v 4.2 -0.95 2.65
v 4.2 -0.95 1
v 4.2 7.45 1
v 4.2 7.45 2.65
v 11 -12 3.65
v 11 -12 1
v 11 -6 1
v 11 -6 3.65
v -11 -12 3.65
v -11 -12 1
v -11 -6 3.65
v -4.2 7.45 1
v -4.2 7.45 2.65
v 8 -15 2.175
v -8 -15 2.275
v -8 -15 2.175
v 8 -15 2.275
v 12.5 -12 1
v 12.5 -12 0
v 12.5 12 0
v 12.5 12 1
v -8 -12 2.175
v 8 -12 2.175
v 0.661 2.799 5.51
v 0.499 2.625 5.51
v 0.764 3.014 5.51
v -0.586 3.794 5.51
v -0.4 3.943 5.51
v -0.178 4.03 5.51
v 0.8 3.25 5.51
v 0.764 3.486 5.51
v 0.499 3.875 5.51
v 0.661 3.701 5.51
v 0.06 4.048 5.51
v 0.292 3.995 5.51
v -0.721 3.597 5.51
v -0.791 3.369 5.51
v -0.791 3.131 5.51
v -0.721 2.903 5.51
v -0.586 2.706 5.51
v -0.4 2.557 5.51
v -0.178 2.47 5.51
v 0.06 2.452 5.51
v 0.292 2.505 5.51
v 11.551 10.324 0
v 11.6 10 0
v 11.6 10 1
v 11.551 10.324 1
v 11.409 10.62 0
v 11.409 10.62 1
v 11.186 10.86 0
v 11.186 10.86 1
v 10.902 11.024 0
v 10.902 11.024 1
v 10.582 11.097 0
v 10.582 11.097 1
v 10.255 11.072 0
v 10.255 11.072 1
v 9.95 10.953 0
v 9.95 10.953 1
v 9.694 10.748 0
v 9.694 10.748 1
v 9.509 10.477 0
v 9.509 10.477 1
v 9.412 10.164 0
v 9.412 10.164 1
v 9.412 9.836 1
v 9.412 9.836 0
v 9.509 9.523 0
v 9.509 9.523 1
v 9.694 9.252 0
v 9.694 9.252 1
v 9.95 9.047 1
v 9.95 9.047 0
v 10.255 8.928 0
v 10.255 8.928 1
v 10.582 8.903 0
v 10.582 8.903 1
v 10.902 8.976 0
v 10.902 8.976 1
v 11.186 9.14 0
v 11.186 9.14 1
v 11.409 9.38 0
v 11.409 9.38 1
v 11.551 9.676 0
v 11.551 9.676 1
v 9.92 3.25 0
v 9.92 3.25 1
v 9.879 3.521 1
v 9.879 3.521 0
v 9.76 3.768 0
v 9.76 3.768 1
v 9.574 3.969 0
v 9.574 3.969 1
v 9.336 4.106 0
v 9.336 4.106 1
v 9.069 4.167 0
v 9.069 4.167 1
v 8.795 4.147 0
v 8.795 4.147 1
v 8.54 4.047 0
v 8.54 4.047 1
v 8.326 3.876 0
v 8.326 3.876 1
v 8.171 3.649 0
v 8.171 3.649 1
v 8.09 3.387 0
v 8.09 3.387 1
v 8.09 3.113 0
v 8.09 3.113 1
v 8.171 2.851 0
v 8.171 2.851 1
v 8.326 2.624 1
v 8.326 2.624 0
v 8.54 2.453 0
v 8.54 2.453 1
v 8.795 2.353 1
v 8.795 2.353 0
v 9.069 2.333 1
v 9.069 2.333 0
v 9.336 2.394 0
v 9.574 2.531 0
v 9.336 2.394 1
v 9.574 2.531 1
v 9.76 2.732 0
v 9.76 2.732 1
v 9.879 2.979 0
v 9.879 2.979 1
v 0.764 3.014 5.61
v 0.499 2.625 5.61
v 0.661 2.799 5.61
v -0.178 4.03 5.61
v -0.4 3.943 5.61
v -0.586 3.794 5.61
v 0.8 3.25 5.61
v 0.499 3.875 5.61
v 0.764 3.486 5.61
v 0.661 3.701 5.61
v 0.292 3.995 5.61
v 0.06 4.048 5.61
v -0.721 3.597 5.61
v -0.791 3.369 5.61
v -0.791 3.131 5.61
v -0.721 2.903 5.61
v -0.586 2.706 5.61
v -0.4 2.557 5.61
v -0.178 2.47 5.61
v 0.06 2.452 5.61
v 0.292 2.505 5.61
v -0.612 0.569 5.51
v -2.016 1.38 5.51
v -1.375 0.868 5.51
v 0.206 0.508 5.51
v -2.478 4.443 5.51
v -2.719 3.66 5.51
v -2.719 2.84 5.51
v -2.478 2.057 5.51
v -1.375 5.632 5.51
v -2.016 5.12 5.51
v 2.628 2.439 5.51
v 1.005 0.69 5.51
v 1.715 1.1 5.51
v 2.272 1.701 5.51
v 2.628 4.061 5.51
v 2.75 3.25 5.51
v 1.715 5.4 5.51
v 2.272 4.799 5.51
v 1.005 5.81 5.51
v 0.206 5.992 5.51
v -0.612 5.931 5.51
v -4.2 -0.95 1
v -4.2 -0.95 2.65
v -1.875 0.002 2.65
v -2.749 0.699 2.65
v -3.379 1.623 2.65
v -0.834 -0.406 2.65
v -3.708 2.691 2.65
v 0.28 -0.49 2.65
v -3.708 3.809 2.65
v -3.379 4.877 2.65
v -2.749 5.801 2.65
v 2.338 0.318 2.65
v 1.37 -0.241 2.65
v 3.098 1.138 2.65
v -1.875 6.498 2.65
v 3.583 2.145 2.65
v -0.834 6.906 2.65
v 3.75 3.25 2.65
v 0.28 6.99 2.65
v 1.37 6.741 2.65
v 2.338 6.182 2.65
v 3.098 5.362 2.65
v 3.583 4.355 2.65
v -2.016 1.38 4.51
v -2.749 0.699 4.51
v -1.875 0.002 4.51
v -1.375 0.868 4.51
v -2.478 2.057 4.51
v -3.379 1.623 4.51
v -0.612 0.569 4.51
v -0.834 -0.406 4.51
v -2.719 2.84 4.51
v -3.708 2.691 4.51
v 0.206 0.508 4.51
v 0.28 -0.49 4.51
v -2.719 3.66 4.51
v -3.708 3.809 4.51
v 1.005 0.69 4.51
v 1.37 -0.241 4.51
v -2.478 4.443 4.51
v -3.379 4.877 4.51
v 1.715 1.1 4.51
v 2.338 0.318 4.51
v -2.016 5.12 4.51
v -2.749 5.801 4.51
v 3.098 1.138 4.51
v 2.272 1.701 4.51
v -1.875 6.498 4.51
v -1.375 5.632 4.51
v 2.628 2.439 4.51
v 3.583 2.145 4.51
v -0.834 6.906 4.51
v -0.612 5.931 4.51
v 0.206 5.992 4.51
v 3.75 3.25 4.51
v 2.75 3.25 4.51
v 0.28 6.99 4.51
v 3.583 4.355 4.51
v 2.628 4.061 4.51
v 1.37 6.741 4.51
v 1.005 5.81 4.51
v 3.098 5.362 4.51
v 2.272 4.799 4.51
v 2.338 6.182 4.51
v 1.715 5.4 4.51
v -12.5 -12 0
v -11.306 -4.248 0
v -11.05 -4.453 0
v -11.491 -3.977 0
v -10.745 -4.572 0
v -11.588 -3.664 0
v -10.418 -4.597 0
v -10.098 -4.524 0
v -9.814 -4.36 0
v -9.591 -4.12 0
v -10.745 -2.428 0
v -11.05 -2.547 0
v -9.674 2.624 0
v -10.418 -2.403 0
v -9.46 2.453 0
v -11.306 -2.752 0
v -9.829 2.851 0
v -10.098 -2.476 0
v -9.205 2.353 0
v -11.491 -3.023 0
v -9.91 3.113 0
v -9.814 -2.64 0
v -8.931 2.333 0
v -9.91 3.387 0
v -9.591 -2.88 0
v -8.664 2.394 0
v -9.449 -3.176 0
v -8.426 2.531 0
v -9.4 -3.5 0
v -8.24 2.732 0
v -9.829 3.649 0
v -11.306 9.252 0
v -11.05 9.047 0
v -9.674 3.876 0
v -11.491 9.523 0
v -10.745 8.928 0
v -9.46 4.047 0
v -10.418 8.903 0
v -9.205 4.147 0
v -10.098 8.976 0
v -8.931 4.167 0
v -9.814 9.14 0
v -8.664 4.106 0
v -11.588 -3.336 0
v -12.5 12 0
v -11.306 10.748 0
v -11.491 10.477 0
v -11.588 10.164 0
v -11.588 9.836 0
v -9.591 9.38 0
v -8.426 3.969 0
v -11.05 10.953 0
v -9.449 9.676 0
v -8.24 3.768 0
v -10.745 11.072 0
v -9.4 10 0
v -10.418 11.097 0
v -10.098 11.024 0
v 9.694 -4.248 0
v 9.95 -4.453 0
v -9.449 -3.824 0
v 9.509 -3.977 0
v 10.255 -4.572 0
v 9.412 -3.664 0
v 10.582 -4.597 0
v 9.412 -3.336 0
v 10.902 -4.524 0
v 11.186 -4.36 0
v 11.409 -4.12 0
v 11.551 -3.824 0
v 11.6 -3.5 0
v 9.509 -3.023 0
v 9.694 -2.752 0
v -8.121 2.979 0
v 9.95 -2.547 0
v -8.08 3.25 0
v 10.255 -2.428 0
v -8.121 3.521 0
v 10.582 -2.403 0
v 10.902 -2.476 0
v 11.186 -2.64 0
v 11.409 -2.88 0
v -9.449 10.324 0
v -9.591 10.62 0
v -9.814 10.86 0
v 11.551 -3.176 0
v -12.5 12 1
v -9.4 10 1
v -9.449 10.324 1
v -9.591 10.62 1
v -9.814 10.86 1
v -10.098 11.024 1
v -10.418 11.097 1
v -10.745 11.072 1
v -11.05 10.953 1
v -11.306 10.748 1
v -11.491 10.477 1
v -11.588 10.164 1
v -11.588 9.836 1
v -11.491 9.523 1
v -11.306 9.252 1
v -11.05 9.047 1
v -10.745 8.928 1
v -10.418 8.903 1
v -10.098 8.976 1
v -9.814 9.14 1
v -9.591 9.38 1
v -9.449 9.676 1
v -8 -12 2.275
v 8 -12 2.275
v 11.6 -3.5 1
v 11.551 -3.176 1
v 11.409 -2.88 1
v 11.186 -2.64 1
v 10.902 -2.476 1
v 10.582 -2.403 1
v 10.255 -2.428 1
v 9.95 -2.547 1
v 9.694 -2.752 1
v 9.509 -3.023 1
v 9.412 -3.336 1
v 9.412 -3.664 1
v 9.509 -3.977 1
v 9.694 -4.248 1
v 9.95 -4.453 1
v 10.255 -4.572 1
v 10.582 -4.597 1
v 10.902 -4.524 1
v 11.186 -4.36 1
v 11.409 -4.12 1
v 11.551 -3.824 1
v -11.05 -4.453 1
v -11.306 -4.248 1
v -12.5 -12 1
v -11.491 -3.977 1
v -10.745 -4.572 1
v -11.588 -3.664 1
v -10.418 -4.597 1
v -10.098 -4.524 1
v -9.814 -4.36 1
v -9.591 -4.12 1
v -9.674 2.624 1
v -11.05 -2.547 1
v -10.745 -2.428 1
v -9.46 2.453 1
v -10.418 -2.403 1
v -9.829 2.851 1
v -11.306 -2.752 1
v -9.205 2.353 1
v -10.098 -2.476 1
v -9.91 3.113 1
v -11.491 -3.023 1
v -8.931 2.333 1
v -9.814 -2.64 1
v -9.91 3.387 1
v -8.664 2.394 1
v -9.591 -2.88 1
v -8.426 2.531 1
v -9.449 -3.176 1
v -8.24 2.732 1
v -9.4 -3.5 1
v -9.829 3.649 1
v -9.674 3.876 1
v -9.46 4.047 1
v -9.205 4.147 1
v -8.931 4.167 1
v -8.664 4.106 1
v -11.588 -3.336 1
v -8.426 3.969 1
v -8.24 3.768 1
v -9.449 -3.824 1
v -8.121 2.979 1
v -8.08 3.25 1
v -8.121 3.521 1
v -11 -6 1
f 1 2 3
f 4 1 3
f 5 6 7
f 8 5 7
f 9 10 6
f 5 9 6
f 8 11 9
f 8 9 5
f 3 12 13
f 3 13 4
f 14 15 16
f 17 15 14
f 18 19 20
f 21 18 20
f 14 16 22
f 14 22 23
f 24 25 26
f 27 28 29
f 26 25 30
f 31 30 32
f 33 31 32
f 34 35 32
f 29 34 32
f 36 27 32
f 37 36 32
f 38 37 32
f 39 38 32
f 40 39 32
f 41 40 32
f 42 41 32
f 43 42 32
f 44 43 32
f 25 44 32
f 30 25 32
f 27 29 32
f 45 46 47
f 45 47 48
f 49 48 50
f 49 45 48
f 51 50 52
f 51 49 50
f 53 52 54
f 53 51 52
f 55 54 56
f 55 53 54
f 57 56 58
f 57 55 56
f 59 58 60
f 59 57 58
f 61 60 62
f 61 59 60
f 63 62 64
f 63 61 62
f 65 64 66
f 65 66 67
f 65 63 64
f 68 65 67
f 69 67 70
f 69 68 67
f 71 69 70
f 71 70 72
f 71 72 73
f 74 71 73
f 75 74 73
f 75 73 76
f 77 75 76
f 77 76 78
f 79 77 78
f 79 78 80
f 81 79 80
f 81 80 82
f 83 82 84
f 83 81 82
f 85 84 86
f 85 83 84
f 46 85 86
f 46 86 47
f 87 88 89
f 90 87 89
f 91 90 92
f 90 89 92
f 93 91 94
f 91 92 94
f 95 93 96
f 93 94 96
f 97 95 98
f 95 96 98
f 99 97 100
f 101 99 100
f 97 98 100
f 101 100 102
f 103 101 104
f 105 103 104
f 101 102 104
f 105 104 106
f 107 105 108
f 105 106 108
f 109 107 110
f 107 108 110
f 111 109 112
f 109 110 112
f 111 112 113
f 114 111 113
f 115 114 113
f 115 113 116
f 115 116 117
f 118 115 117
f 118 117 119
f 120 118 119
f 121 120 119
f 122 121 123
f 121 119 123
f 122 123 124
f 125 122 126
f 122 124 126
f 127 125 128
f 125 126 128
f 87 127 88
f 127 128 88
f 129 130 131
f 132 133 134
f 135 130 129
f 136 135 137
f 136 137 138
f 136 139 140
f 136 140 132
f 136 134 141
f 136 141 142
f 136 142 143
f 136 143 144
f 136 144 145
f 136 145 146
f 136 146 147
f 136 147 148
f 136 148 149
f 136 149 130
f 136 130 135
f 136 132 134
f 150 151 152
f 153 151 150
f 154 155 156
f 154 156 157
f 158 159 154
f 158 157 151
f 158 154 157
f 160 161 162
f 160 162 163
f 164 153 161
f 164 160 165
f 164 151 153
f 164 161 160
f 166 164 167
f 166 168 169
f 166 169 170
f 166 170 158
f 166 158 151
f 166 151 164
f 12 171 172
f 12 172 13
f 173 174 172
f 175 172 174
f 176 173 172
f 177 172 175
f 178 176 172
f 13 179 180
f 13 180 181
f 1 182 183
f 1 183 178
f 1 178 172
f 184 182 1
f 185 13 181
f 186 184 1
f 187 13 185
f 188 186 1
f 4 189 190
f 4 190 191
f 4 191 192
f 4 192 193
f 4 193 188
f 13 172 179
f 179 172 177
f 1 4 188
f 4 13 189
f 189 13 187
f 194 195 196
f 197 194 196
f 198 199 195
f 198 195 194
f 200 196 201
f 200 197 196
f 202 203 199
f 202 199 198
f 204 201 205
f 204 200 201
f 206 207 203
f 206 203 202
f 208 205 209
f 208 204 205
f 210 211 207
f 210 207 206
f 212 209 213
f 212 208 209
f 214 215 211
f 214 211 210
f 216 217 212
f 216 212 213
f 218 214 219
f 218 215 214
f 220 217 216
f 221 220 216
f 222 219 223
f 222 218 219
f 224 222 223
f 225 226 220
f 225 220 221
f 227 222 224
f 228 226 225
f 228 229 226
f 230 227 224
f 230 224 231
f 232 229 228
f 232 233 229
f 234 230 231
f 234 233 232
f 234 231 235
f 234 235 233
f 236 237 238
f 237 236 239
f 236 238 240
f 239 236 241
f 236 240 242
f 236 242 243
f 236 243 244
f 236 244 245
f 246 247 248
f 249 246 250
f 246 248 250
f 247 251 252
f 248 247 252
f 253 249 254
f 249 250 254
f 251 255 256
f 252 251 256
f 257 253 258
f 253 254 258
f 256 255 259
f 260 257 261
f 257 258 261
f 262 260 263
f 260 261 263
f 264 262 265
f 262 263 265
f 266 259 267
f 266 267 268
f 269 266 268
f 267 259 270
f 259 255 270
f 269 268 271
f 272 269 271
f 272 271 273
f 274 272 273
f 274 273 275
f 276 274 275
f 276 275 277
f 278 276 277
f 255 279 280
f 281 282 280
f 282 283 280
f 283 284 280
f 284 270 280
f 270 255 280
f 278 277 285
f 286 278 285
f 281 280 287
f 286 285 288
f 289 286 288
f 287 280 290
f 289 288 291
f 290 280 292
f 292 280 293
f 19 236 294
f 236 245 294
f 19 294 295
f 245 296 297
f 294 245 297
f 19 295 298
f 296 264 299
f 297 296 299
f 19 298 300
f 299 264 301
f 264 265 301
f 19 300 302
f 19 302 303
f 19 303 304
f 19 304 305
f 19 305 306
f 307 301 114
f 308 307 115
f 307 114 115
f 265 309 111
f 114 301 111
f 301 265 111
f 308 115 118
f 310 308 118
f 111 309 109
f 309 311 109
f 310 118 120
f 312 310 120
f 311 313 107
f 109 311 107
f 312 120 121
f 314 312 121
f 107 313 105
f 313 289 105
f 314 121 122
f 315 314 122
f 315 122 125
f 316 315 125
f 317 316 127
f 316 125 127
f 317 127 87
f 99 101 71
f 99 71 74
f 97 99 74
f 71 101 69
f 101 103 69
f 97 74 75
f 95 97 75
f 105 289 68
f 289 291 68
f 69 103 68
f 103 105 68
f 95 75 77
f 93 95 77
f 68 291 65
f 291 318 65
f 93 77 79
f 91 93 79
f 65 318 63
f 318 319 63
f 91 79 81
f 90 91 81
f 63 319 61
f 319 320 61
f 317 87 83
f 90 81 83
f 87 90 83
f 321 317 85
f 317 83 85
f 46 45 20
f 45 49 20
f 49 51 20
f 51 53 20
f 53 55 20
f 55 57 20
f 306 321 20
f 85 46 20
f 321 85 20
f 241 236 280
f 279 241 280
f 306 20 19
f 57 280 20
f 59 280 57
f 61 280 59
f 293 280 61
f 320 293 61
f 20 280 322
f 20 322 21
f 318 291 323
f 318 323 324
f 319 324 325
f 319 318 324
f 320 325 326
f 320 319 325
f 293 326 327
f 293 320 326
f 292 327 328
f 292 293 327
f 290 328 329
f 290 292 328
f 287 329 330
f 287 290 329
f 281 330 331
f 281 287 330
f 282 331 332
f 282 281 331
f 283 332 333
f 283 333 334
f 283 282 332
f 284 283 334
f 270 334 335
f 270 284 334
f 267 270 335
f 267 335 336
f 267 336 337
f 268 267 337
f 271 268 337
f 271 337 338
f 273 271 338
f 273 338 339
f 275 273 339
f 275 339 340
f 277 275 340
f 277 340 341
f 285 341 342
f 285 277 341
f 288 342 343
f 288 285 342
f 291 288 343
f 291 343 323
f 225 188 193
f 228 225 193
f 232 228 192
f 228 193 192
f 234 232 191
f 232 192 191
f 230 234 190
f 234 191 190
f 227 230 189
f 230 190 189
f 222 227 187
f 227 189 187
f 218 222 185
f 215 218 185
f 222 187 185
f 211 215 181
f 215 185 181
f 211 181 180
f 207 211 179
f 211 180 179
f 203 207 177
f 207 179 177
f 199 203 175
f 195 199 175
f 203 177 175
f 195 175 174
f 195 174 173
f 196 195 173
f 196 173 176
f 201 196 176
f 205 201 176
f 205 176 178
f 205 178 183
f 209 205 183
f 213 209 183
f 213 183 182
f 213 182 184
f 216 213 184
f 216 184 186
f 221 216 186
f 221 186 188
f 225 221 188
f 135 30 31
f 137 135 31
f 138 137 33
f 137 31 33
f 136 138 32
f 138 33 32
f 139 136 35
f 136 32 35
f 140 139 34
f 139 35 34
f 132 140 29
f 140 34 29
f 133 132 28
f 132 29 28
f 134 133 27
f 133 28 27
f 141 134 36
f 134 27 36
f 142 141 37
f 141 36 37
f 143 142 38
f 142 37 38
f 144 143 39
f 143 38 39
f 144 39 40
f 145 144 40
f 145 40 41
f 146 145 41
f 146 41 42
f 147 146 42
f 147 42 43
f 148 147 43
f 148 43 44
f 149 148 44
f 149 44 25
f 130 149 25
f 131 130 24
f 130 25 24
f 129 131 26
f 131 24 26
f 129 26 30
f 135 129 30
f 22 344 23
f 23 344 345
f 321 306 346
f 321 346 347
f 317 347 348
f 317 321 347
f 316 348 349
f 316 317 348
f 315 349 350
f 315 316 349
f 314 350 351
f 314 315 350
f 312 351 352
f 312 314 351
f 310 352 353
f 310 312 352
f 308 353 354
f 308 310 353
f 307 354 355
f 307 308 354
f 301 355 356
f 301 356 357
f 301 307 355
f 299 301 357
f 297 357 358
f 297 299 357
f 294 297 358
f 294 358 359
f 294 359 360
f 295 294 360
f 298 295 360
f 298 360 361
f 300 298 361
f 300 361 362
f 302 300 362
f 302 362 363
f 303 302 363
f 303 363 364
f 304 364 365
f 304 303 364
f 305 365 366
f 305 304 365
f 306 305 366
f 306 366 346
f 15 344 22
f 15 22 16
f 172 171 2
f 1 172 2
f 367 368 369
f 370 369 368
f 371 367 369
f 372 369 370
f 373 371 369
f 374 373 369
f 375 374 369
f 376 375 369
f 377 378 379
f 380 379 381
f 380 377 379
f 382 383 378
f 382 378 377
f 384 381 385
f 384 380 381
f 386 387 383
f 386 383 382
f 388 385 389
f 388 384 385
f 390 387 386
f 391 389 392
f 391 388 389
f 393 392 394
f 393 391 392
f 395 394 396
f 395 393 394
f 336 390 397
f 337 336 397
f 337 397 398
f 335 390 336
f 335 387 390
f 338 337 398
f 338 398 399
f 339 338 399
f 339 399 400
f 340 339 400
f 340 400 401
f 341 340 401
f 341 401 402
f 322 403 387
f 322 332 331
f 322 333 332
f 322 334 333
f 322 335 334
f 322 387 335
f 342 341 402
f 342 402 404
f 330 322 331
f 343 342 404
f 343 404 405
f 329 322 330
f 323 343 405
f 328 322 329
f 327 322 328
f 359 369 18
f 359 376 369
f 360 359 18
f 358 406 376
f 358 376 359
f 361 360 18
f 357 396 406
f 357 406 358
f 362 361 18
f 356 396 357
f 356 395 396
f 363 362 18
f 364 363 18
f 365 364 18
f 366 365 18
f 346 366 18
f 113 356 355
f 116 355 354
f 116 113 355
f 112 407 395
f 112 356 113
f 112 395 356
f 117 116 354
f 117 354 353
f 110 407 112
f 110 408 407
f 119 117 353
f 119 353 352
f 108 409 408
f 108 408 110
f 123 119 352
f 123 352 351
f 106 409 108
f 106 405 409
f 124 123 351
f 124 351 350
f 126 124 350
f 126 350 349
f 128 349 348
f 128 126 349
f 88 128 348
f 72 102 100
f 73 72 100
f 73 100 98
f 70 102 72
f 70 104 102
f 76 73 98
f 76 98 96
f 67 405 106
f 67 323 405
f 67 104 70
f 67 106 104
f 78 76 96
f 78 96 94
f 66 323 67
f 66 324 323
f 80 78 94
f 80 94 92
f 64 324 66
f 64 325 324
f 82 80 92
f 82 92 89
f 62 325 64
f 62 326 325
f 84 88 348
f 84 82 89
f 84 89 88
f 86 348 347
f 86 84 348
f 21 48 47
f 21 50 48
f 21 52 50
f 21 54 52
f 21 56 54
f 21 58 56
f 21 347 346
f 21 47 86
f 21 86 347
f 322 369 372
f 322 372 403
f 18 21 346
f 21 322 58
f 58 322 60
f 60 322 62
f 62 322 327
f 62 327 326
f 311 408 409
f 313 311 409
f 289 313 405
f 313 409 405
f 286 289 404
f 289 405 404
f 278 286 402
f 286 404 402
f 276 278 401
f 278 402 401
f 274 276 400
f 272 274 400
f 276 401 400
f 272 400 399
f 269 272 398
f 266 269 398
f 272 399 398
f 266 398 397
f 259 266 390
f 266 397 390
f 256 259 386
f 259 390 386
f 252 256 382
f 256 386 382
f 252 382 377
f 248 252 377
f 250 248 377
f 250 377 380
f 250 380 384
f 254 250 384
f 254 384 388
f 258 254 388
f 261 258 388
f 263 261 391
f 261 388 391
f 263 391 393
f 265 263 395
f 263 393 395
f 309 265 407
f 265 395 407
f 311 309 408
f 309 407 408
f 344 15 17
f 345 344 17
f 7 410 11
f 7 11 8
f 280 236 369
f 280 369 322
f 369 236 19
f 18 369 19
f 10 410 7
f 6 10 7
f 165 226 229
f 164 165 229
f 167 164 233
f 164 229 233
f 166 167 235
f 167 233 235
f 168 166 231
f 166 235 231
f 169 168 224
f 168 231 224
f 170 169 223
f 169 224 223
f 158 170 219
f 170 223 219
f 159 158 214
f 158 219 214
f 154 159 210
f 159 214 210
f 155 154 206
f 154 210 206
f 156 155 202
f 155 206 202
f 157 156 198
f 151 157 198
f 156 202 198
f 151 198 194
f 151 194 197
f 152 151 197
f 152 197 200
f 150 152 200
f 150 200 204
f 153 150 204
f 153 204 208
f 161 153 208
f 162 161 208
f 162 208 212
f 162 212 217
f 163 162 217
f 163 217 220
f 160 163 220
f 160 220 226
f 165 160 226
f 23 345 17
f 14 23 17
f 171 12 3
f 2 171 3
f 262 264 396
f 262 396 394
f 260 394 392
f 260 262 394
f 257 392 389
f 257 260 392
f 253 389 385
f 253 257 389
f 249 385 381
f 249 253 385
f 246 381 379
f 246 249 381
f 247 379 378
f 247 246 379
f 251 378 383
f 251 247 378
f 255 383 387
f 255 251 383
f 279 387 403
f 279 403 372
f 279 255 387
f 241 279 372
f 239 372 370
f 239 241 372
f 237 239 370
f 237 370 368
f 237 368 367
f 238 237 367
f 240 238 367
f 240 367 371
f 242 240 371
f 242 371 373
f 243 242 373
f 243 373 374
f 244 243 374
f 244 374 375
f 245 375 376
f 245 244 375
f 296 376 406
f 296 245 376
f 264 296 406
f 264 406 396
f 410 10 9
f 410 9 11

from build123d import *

# Parameters (mm, degrees)
F0_W      = 25
F0_H      = 24
F0_R      = 1.1
F1_DEPTH  = 1
F2_R      = 0.92
F3_DEPTH  = 1
F2_W      = 8.4
F2_H      = 8.4
F2_R_2    = 3.75
F2_R_3    = 2.75
F4_DEPTH  = 1.65
F5_DEPTH  = 3.51
F6_DEPTH  = 4.51
F7_R      = 0.8
F8_DEPTH  = 0.1
F9_W      = 22
F9_H      = 6
F10_DEPTH = 2.65
F12_W     = 16
F12_H     = 3
F13_DEPTH = 0.1


with BuildPart() as f1:
    # F0 (on Top) → F1 (new body)
    with BuildSketch(Plane.XY):
        Rectangle(F0_W, F0_H)
        with Locations((-10.5, -3.5)):
            Circle(F0_R, mode=Mode.SUBTRACT)
        with Locations((10.5, -3.5)):
            Circle(F0_R, mode=Mode.SUBTRACT)
        with Locations((-10.5, 10)):
            Circle(F0_R, mode=Mode.SUBTRACT)
        with Locations((10.5, 10)):
            Circle(F0_R, mode=Mode.SUBTRACT)
    extrude(amount=F1_DEPTH)

    # F2 (on face) → F3 (cut, through all)
    with BuildSketch(Plane.XY.offset(1)):
        with Locations((-9, 3.25)):
            Circle(F2_R)
        with Locations((9, 3.25)):
            Circle(F2_R)
    extrude(amount=-F3_DEPTH, mode=Mode.SUBTRACT)


with BuildPart() as f4:
    # F2 (on face) → F4 (new body)
    with BuildSketch(Plane.XY.offset(1)):
        with Locations((0, 3.25)):
            Rectangle(F2_W, F2_H)
        with Locations((0, 3.25)):
            Circle(F2_R_2, mode=Mode.SUBTRACT)
        with Locations((0, 3.25)):
            Circle(F2_R_2)
        with Locations((0, 3.25)):
            Circle(F2_R_3, mode=Mode.SUBTRACT)
        with Locations((0, 3.25)):
            Circle(F2_R_3)
    extrude(amount=F4_DEPTH)

    # F2 (on face) → F5 (join)
    with BuildSketch(Plane.XY.offset(1)):
        with Locations((0, 3.25)):
            Circle(F2_R_2)
        with Locations((0, 3.25)):
            Circle(F2_R_3, mode=Mode.SUBTRACT)
        with Locations((0, 3.25)):
            Circle(F2_R_3)
    extrude(amount=F5_DEPTH)

    # F2 (on face) → F6 (join)
    with BuildSketch(Plane.XY.offset(1)):
        with Locations((0, 3.25)):
            Circle(F2_R_3)
    extrude(amount=F6_DEPTH)


with BuildPart() as f8:
    # F7 (on face) → F8 (new body)
    with BuildSketch(Plane.XY.offset(5.51)):
        with Locations((0, 3.25)):
            Circle(F7_R)
    extrude(amount=F8_DEPTH)


with BuildPart() as f10:
    # F9 (on face) → F10 (new body)
    with BuildSketch(Plane.XY.offset(1)):
        with Locations((0, -9)):
            Rectangle(F9_W, F9_H)
    extrude(amount=F10_DEPTH)


with BuildPart() as f13:
    # F12 (on offset) → F13 (new body)
    with BuildSketch(Plane(origin=(0, 0, 2.275), x_dir=(1, 0, 0), z_dir=(0, 0, -1))):
        with Locations((0, 13.5)):
            Rectangle(F12_W, F12_H)
    extrude(amount=F13_DEPTH)


solid = Compound([f1.part, f4.part, f8.part, f10.part, f13.part])
